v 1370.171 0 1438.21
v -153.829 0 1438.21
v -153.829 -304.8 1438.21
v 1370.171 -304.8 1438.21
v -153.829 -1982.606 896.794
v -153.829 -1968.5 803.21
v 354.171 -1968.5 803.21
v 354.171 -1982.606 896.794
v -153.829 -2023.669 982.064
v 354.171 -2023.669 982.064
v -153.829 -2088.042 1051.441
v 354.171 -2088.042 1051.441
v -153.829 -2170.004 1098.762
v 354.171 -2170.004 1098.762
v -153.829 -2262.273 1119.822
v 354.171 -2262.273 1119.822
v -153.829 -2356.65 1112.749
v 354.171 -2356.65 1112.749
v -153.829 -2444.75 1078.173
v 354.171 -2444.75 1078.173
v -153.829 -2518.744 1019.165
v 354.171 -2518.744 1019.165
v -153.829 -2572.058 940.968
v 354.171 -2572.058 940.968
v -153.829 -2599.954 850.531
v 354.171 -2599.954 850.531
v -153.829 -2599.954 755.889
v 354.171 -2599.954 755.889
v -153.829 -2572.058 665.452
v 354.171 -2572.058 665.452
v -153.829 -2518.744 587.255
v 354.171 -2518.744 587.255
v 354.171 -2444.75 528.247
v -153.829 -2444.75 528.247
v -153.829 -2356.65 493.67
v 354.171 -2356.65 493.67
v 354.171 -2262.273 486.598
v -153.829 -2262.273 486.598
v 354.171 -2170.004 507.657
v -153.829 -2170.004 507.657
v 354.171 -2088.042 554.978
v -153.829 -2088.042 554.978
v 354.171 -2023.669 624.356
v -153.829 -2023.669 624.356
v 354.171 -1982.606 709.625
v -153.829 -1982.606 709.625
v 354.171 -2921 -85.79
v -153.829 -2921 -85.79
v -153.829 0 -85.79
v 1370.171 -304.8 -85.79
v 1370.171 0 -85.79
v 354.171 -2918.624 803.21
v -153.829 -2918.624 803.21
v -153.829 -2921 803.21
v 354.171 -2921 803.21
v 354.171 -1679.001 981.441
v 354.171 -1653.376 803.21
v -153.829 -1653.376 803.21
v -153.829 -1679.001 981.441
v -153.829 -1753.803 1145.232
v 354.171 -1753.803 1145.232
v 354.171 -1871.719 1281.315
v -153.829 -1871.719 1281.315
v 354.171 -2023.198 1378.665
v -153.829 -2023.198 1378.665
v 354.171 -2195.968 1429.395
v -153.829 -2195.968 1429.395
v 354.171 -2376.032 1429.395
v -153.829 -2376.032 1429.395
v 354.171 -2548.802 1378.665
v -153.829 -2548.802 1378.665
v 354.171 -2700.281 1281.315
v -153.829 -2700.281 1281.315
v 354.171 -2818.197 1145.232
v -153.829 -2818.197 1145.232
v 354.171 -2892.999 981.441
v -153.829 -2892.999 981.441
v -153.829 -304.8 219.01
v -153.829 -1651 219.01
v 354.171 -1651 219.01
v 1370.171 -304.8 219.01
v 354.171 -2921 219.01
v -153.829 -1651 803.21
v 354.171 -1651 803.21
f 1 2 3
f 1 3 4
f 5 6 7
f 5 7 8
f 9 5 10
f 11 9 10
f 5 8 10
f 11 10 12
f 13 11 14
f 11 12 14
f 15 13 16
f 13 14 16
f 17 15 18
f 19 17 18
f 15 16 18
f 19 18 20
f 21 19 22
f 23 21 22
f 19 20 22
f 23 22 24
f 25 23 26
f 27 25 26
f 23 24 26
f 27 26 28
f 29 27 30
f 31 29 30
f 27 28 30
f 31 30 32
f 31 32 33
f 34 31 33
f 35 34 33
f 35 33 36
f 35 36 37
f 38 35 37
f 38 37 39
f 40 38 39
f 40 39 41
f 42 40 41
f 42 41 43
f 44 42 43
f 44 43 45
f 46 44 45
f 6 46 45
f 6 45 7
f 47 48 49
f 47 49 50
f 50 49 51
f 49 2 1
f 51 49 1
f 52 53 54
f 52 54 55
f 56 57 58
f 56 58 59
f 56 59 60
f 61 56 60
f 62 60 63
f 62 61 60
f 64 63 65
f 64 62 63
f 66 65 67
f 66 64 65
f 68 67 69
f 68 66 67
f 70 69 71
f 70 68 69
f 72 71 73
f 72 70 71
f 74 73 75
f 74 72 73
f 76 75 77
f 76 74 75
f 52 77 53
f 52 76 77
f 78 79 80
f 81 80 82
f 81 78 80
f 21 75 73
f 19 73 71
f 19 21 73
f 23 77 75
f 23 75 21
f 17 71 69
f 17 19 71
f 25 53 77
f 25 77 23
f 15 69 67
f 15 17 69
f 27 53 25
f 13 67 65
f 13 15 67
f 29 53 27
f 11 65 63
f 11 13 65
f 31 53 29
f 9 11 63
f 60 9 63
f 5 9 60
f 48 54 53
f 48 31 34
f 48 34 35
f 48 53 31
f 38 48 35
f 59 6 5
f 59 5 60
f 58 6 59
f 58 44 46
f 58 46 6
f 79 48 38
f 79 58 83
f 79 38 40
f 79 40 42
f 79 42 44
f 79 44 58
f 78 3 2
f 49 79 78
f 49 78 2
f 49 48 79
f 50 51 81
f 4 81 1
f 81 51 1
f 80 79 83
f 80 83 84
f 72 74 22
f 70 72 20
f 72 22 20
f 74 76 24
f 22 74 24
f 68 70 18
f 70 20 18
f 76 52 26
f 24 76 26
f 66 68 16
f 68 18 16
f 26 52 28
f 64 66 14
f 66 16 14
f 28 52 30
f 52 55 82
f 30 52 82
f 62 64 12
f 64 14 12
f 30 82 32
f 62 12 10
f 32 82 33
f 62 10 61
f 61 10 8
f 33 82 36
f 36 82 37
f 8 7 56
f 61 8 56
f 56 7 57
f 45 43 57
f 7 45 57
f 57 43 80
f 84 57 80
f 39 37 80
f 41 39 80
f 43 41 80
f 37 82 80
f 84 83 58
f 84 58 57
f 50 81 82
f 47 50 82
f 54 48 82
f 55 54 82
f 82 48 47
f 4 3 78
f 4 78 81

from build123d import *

# Parameters (mm, degrees)
F0_W      = 1524
F0_H      = 1524
F1_DEPTH  = 304.8
F2_W      = 1524
F2_H      = 304.8
F3_DEPTH  = 2616.2
F4_W      = 508
F4_H      = 1270
F5_DEPTH  = 584.2
F7_DEPTH  = 508
F10_R     = 317.5
F11_DEPTH = 1231.9
F14_DEPTH = 1102.36


with BuildPart() as f1:
    # F0 (on Front) → F1 (new body)
    with BuildSketch(Plane.XZ):
        with Locations((608.1712, 676.209716)):
            Rectangle(F0_W, F0_H)
    extrude(amount=F1_DEPTH)

    # F2 (on face) → F3 (join)
    with BuildSketch(Plane.XZ.offset(304.8)):
        with Locations((608.1712, 66.609716)):
            Rectangle(F2_W, F2_H)
    extrude(amount=F3_DEPTH)

    # F4 (on face) → F5 (join)
    with BuildSketch(Plane.XY.offset(219.009716)):
        with Locations((100.1712, -2286)):
            Rectangle(F4_W, F4_H)
    extrude(amount=F5_DEPTH)

    # F6 (on face) → F7 (join)
    with BuildSketch(Plane.YZ.offset(354.1712)):
        with BuildLine():
            Line((-2918.624303, 803.209716), (-1653.375697, 803.209716))
            ThreePointArc((-1653.375697, 803.209716), (-2286, 1435.834019), (-2918.624303, 803.209716))
        make_face()
    extrude(amount=-F7_DEPTH)

    # F10 (on face) → F11 (cut)
    with BuildSketch(Plane.YZ.offset(354.1712)):
        with Locations((-2286, 803.209716)):
            Circle(F10_R)
    extrude(amount=-F11_DEPTH, mode=Mode.SUBTRACT)

    # F12 (on face) → F14 (cut)
    with BuildSketch(Plane.XY.offset(219.009716)):
        Polygon((1370.1712, -304.8), (354.1712, -2921), (1370.1712, -2921), align=None)
    extrude(amount=-F14_DEPTH, mode=Mode.SUBTRACT)


solid = f1.part
